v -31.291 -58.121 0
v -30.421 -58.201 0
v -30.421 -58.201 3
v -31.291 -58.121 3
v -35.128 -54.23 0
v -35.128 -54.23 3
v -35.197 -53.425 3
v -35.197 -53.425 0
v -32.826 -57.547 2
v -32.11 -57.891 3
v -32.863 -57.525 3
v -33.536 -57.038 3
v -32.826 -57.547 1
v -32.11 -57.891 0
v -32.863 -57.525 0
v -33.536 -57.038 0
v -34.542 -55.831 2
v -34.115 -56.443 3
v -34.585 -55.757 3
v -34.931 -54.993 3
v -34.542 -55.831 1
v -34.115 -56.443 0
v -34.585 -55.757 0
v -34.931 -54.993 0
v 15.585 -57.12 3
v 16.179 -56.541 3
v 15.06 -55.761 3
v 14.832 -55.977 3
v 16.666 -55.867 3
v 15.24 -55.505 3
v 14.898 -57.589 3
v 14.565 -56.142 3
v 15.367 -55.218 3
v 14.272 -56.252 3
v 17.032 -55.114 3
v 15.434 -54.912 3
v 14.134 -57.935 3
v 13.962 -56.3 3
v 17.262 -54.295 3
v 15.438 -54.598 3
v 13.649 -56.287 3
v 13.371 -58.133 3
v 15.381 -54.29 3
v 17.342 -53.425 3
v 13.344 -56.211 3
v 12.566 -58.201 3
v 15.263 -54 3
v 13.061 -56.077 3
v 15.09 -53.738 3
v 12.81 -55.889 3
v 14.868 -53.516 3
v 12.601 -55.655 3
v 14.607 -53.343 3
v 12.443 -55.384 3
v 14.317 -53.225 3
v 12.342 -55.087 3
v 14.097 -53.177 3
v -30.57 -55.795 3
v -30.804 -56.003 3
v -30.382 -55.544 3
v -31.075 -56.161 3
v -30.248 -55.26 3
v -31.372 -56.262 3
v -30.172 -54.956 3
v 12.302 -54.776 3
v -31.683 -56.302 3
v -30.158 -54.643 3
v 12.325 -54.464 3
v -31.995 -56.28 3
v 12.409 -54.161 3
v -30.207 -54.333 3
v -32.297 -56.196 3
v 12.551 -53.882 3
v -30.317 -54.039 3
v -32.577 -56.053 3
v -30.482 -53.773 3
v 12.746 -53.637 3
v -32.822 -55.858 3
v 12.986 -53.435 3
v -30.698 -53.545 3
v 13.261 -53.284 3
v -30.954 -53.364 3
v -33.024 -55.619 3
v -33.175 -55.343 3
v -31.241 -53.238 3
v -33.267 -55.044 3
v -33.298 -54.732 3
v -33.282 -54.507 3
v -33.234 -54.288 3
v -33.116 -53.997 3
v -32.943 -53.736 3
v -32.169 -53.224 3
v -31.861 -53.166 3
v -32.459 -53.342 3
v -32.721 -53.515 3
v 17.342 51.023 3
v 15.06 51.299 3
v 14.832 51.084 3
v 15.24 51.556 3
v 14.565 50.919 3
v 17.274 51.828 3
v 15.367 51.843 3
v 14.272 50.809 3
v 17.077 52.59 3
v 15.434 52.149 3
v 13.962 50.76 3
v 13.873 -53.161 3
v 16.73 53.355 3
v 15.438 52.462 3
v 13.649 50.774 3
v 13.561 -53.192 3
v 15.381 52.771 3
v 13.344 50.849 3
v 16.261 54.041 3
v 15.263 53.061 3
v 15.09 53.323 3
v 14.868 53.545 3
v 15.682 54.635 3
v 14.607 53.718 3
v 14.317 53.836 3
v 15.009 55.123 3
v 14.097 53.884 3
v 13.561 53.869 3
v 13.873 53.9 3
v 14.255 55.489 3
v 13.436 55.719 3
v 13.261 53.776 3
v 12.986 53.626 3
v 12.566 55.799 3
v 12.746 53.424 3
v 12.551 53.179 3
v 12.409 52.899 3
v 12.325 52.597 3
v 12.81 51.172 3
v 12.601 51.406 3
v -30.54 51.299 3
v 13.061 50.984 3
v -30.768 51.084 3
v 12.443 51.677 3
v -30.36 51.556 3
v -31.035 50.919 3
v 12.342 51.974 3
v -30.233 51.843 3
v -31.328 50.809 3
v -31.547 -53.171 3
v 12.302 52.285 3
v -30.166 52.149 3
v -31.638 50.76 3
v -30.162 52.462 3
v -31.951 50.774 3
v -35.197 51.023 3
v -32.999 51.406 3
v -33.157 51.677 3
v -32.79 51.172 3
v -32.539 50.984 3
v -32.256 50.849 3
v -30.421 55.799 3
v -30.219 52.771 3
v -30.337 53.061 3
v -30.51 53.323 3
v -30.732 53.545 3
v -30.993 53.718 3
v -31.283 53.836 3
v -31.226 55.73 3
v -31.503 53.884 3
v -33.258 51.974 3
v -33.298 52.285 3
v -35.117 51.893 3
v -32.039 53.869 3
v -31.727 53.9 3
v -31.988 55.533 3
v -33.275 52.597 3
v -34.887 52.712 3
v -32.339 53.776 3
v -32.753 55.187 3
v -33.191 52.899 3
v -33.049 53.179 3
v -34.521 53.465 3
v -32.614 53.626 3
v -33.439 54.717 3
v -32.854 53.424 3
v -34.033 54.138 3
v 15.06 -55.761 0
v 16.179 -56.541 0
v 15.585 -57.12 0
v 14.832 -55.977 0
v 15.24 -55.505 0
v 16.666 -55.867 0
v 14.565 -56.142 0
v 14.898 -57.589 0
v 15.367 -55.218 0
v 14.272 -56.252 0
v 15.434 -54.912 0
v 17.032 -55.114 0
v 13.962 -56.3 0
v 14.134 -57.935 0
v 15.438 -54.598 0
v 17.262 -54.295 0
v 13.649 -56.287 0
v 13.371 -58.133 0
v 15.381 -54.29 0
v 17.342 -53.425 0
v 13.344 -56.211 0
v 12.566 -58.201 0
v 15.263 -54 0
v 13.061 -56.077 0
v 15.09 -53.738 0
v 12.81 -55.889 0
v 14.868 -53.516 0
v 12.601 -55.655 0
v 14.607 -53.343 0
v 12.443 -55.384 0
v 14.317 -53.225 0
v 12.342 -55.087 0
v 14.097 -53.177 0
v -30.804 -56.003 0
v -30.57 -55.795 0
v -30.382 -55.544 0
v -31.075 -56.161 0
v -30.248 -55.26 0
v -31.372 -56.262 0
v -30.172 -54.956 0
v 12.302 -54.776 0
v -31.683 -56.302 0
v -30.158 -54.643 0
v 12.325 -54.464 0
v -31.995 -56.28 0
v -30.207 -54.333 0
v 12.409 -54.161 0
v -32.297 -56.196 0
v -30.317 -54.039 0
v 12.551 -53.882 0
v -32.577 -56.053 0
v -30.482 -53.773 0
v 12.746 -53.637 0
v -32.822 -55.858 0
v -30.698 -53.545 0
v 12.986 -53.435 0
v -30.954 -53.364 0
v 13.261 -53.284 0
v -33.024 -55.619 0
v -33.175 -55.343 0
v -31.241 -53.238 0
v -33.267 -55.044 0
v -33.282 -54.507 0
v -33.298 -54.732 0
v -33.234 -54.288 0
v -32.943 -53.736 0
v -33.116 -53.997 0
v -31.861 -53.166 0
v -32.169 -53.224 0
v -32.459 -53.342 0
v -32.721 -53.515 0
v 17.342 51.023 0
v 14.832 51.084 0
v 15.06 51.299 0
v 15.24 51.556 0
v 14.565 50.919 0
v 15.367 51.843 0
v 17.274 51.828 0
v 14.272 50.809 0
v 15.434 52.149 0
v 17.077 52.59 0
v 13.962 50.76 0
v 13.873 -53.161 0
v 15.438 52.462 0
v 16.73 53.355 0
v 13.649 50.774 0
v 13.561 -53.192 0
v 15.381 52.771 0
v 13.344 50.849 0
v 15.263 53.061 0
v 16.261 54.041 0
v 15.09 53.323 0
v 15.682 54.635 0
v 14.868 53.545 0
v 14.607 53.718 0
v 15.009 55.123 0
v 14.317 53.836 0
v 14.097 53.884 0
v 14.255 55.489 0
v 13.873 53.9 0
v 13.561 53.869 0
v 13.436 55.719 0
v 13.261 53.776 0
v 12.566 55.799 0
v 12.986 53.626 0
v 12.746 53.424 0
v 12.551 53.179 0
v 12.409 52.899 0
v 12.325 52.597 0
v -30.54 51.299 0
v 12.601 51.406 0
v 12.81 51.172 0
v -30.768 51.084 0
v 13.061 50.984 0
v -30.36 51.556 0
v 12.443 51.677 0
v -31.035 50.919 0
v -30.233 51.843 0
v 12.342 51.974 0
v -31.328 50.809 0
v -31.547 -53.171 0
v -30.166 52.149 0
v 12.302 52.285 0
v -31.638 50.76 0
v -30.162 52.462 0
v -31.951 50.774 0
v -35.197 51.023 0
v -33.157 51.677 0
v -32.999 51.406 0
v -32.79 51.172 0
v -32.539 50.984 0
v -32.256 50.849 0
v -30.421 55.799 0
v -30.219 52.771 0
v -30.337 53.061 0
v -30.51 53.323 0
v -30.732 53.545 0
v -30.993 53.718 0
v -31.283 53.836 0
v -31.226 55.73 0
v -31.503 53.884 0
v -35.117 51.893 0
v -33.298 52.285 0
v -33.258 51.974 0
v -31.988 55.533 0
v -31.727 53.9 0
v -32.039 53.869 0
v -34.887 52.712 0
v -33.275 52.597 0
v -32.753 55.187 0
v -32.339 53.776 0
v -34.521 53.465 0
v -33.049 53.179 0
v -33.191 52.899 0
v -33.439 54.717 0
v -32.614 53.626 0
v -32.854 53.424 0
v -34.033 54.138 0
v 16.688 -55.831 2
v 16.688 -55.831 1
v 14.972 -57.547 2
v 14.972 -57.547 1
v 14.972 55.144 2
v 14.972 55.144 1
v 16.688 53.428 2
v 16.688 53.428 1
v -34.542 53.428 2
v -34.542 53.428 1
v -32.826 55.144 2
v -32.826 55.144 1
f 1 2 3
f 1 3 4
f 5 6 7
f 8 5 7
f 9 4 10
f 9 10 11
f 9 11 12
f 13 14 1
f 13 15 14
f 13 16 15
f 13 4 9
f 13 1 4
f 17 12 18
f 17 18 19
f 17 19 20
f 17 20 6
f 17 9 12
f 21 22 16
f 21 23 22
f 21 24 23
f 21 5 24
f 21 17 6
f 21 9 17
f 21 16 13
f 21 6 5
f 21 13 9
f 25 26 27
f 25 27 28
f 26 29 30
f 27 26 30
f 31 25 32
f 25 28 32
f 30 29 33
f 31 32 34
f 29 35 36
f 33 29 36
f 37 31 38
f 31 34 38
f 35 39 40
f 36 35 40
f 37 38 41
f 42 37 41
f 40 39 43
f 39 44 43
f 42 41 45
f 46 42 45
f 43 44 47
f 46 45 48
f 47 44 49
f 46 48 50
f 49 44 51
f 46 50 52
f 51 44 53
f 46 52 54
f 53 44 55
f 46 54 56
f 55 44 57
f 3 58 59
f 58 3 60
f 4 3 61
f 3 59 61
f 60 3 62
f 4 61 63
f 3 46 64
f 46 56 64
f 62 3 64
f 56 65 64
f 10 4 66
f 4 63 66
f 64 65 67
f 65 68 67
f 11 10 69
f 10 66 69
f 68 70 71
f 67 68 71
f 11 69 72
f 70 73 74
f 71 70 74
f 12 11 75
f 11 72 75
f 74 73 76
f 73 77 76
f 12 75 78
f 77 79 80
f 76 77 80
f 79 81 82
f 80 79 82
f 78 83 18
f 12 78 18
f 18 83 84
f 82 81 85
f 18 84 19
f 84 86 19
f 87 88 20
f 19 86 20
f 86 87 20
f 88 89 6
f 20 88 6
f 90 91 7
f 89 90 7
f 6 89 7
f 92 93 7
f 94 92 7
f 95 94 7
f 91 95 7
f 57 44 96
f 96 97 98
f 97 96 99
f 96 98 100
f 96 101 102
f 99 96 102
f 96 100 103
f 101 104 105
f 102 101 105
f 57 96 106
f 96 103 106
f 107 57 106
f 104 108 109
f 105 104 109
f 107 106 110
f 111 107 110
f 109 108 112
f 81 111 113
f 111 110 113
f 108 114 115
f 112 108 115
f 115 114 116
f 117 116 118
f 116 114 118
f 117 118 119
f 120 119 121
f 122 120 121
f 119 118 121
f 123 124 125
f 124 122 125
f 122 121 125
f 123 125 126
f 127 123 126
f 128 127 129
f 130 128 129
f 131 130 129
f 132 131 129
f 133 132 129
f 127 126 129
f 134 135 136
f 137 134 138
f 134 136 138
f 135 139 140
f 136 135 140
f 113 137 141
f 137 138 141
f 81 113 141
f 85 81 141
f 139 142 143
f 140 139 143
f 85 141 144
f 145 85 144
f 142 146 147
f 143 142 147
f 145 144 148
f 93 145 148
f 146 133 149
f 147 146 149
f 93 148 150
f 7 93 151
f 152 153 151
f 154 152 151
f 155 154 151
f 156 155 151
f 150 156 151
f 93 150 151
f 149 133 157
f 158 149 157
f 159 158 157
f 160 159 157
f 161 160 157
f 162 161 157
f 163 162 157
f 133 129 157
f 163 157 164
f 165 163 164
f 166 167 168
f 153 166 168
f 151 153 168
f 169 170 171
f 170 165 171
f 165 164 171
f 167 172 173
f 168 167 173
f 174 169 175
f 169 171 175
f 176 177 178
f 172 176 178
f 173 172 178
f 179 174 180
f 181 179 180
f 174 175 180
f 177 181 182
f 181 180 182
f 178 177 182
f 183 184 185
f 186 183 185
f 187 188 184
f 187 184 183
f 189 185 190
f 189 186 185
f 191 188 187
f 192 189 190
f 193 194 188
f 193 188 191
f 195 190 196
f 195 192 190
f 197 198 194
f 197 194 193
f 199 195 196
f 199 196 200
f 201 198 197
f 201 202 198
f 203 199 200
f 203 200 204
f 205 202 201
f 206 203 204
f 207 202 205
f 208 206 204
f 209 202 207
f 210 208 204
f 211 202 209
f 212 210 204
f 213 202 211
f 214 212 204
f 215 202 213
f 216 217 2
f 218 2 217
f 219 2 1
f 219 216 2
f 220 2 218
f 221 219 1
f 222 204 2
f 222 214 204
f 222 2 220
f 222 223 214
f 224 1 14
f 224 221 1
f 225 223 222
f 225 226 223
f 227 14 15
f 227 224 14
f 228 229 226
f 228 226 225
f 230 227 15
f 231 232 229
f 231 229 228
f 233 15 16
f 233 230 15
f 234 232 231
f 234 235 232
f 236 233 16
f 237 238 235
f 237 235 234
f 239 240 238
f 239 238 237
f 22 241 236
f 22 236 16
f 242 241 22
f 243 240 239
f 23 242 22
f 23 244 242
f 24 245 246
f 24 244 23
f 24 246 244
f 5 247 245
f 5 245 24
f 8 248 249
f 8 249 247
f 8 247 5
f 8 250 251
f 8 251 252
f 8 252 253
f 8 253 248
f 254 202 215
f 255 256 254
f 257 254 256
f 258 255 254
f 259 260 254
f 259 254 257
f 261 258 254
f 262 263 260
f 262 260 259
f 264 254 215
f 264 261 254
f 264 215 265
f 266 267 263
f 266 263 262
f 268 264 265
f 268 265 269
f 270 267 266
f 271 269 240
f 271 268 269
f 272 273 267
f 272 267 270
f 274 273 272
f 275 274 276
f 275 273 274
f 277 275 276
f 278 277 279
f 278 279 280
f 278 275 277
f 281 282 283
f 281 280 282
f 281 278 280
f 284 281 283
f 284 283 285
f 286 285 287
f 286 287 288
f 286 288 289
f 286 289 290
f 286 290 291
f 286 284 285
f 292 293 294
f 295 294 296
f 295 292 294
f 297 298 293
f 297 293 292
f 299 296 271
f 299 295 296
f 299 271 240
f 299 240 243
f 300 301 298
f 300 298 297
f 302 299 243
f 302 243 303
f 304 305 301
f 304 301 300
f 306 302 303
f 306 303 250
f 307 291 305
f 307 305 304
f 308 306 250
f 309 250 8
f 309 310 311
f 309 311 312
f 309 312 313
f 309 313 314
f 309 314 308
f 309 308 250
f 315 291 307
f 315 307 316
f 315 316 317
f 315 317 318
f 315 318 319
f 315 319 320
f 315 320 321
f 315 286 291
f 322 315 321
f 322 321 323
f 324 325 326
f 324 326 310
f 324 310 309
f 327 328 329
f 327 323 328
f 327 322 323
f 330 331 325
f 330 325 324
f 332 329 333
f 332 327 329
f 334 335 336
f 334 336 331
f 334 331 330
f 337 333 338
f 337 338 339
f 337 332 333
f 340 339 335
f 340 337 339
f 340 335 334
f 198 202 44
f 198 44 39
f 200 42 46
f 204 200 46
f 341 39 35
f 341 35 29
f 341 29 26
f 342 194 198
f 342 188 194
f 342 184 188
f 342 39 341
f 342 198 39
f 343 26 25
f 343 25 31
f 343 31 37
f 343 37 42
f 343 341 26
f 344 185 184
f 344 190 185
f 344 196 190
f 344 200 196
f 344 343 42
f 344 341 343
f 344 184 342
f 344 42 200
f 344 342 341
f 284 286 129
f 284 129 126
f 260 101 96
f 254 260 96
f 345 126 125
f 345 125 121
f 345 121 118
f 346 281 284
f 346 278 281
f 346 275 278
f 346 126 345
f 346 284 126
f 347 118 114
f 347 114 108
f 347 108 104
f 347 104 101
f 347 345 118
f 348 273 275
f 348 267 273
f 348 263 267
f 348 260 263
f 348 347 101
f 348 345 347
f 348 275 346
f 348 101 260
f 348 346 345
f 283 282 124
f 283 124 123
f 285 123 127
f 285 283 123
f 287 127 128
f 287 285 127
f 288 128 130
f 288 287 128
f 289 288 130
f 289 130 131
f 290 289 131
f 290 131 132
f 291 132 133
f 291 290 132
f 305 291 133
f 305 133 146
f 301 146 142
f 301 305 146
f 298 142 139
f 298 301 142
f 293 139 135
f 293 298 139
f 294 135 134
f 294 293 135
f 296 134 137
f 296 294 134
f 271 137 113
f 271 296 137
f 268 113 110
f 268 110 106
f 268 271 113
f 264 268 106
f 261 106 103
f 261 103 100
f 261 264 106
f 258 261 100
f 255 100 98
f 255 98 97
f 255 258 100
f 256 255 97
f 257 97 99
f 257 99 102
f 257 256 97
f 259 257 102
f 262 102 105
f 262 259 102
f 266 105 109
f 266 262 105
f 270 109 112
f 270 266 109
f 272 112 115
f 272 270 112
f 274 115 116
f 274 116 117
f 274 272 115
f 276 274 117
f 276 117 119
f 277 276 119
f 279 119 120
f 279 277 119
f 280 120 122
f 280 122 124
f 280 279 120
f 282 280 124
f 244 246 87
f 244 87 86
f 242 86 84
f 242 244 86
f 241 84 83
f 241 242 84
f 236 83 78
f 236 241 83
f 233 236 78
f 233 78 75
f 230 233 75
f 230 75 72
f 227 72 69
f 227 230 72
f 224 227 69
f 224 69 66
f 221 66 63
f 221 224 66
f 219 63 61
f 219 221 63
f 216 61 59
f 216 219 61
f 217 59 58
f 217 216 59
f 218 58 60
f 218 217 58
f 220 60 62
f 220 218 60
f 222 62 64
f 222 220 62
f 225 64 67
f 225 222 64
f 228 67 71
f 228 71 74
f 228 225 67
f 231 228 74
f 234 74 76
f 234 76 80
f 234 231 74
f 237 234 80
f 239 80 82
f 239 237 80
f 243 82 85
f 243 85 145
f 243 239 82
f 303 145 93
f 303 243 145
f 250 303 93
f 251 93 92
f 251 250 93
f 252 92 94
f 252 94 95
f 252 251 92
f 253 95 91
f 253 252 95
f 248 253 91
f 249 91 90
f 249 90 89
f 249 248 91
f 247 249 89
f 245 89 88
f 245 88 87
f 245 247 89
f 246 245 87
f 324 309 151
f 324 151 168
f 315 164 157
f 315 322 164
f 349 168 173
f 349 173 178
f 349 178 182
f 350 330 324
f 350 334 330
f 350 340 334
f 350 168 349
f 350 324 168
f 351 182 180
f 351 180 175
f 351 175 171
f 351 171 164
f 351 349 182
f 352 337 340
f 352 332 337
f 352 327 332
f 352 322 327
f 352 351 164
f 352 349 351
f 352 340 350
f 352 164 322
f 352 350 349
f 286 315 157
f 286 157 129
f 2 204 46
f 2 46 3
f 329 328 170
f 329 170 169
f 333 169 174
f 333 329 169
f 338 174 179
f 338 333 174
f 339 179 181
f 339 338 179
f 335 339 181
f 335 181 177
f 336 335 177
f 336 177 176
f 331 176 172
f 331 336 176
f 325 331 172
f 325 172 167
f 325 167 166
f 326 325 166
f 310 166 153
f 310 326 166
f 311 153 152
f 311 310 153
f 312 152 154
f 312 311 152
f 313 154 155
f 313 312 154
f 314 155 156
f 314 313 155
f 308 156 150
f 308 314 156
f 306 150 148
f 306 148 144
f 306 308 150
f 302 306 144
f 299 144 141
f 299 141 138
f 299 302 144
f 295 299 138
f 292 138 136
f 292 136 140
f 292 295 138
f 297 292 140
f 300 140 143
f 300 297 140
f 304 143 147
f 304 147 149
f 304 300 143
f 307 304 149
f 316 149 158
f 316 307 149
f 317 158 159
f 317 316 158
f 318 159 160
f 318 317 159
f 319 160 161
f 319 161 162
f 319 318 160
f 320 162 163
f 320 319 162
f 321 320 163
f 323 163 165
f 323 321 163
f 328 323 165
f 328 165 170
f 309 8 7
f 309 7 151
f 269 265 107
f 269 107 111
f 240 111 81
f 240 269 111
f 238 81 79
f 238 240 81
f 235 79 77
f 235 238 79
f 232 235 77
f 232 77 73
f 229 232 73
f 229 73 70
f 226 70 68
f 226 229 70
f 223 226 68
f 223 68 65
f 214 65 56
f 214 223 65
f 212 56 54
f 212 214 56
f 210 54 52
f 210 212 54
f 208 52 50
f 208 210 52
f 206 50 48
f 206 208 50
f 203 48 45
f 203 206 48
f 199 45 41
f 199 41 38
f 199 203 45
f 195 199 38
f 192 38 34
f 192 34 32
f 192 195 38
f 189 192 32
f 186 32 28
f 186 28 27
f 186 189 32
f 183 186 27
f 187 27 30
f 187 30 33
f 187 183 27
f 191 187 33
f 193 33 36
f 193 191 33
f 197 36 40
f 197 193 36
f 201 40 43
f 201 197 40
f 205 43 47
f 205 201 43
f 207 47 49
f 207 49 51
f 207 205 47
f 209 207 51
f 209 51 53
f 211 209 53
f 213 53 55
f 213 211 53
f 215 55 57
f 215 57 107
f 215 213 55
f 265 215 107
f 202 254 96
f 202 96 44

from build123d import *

# Parameters (mm, degrees)
MODEL_RX                = 1.571217391
MODEL_RY                = 1.571217391
SALIENTE_EXTRUIR1_DEPTH = 3


with BuildPart() as part:
    # Model → Saliente-Extruir1 (new body)
    with BuildSketch(Plane.XY):
        with BuildLine():
            Line((-30.420546945, 55.798863477), (12.566275653, 55.798863477))
            add(Edge.make_bspline(
                [(12.566275653, 55.798863477), (15.193133044, 55.798863477), (17.34238, 53.649616521), (17.34238, 51.02266)],
                knots=[0.111111111, 0.111111111, 0.111111111, 0.111111111, 0.222222222, 0.222222222, 0.222222222, 0.222222222], degree=3))
            Line((17.34238, 51.02266), (17.34238, -53.425032149))
            add(Edge.make_bspline(
                [(17.34238, -53.425032149), (17.34238, -56.05198867), (15.193133044, -58.201235626), (12.566275653, -58.201235626)],
                knots=[0.333333333, 0.333333333, 0.333333333, 0.333333333, 0.444444444, 0.444444444, 0.444444444, 0.444444444], degree=3))
            Line((12.566275653, -58.201235626), (-30.420546945, -58.201235626))
            add(Edge.make_bspline(
                [(-30.420546945, -58.201235626), (-33.047404336, -58.201235626), (-35.196750422, -56.05198867), (-35.196750422, -53.425032149)],
                knots=[0.555555556, 0.555555556, 0.555555556, 0.555555556, 0.666666667, 0.666666667, 0.666666667, 0.666666667], degree=3))
            Line((-35.196750422, -53.425032149), (-35.196750422, 51.02266))
            add(Edge.make_bspline(
                [(-35.196750422, 51.02266), (-35.196750422, 53.649616521), (-33.047404336, 55.798863477), (-30.420546945, 55.798863477)],
                knots=[0.777777778, 0.777777778, 0.777777778, 0.777777778, 1, 1, 1, 1], degree=3))
        make_face()
        with Locations(Location((-31.727185206, 52.3291), (0, 0, 90))):
            Ellipse(MODEL_RX, MODEL_RY, mode=Mode.SUBTRACT)
        with Locations(Location((13.872814783, 52.3291), (0, 0, 90))):
            Ellipse(MODEL_RX, MODEL_RY, mode=Mode.SUBTRACT)
        with Locations(Location((-31.727185206, -54.73176954), (0, 0, 180))):
            Ellipse(MODEL_RX, MODEL_RY, mode=Mode.SUBTRACT)
        with Locations(Location((13.872814783, -54.73176954), (0, 0, 90))):
            Ellipse(MODEL_RX, MODEL_RY, mode=Mode.SUBTRACT)
    extrude(amount=SALIENTE_EXTRUIR1_DEPTH)


solid = part.part
